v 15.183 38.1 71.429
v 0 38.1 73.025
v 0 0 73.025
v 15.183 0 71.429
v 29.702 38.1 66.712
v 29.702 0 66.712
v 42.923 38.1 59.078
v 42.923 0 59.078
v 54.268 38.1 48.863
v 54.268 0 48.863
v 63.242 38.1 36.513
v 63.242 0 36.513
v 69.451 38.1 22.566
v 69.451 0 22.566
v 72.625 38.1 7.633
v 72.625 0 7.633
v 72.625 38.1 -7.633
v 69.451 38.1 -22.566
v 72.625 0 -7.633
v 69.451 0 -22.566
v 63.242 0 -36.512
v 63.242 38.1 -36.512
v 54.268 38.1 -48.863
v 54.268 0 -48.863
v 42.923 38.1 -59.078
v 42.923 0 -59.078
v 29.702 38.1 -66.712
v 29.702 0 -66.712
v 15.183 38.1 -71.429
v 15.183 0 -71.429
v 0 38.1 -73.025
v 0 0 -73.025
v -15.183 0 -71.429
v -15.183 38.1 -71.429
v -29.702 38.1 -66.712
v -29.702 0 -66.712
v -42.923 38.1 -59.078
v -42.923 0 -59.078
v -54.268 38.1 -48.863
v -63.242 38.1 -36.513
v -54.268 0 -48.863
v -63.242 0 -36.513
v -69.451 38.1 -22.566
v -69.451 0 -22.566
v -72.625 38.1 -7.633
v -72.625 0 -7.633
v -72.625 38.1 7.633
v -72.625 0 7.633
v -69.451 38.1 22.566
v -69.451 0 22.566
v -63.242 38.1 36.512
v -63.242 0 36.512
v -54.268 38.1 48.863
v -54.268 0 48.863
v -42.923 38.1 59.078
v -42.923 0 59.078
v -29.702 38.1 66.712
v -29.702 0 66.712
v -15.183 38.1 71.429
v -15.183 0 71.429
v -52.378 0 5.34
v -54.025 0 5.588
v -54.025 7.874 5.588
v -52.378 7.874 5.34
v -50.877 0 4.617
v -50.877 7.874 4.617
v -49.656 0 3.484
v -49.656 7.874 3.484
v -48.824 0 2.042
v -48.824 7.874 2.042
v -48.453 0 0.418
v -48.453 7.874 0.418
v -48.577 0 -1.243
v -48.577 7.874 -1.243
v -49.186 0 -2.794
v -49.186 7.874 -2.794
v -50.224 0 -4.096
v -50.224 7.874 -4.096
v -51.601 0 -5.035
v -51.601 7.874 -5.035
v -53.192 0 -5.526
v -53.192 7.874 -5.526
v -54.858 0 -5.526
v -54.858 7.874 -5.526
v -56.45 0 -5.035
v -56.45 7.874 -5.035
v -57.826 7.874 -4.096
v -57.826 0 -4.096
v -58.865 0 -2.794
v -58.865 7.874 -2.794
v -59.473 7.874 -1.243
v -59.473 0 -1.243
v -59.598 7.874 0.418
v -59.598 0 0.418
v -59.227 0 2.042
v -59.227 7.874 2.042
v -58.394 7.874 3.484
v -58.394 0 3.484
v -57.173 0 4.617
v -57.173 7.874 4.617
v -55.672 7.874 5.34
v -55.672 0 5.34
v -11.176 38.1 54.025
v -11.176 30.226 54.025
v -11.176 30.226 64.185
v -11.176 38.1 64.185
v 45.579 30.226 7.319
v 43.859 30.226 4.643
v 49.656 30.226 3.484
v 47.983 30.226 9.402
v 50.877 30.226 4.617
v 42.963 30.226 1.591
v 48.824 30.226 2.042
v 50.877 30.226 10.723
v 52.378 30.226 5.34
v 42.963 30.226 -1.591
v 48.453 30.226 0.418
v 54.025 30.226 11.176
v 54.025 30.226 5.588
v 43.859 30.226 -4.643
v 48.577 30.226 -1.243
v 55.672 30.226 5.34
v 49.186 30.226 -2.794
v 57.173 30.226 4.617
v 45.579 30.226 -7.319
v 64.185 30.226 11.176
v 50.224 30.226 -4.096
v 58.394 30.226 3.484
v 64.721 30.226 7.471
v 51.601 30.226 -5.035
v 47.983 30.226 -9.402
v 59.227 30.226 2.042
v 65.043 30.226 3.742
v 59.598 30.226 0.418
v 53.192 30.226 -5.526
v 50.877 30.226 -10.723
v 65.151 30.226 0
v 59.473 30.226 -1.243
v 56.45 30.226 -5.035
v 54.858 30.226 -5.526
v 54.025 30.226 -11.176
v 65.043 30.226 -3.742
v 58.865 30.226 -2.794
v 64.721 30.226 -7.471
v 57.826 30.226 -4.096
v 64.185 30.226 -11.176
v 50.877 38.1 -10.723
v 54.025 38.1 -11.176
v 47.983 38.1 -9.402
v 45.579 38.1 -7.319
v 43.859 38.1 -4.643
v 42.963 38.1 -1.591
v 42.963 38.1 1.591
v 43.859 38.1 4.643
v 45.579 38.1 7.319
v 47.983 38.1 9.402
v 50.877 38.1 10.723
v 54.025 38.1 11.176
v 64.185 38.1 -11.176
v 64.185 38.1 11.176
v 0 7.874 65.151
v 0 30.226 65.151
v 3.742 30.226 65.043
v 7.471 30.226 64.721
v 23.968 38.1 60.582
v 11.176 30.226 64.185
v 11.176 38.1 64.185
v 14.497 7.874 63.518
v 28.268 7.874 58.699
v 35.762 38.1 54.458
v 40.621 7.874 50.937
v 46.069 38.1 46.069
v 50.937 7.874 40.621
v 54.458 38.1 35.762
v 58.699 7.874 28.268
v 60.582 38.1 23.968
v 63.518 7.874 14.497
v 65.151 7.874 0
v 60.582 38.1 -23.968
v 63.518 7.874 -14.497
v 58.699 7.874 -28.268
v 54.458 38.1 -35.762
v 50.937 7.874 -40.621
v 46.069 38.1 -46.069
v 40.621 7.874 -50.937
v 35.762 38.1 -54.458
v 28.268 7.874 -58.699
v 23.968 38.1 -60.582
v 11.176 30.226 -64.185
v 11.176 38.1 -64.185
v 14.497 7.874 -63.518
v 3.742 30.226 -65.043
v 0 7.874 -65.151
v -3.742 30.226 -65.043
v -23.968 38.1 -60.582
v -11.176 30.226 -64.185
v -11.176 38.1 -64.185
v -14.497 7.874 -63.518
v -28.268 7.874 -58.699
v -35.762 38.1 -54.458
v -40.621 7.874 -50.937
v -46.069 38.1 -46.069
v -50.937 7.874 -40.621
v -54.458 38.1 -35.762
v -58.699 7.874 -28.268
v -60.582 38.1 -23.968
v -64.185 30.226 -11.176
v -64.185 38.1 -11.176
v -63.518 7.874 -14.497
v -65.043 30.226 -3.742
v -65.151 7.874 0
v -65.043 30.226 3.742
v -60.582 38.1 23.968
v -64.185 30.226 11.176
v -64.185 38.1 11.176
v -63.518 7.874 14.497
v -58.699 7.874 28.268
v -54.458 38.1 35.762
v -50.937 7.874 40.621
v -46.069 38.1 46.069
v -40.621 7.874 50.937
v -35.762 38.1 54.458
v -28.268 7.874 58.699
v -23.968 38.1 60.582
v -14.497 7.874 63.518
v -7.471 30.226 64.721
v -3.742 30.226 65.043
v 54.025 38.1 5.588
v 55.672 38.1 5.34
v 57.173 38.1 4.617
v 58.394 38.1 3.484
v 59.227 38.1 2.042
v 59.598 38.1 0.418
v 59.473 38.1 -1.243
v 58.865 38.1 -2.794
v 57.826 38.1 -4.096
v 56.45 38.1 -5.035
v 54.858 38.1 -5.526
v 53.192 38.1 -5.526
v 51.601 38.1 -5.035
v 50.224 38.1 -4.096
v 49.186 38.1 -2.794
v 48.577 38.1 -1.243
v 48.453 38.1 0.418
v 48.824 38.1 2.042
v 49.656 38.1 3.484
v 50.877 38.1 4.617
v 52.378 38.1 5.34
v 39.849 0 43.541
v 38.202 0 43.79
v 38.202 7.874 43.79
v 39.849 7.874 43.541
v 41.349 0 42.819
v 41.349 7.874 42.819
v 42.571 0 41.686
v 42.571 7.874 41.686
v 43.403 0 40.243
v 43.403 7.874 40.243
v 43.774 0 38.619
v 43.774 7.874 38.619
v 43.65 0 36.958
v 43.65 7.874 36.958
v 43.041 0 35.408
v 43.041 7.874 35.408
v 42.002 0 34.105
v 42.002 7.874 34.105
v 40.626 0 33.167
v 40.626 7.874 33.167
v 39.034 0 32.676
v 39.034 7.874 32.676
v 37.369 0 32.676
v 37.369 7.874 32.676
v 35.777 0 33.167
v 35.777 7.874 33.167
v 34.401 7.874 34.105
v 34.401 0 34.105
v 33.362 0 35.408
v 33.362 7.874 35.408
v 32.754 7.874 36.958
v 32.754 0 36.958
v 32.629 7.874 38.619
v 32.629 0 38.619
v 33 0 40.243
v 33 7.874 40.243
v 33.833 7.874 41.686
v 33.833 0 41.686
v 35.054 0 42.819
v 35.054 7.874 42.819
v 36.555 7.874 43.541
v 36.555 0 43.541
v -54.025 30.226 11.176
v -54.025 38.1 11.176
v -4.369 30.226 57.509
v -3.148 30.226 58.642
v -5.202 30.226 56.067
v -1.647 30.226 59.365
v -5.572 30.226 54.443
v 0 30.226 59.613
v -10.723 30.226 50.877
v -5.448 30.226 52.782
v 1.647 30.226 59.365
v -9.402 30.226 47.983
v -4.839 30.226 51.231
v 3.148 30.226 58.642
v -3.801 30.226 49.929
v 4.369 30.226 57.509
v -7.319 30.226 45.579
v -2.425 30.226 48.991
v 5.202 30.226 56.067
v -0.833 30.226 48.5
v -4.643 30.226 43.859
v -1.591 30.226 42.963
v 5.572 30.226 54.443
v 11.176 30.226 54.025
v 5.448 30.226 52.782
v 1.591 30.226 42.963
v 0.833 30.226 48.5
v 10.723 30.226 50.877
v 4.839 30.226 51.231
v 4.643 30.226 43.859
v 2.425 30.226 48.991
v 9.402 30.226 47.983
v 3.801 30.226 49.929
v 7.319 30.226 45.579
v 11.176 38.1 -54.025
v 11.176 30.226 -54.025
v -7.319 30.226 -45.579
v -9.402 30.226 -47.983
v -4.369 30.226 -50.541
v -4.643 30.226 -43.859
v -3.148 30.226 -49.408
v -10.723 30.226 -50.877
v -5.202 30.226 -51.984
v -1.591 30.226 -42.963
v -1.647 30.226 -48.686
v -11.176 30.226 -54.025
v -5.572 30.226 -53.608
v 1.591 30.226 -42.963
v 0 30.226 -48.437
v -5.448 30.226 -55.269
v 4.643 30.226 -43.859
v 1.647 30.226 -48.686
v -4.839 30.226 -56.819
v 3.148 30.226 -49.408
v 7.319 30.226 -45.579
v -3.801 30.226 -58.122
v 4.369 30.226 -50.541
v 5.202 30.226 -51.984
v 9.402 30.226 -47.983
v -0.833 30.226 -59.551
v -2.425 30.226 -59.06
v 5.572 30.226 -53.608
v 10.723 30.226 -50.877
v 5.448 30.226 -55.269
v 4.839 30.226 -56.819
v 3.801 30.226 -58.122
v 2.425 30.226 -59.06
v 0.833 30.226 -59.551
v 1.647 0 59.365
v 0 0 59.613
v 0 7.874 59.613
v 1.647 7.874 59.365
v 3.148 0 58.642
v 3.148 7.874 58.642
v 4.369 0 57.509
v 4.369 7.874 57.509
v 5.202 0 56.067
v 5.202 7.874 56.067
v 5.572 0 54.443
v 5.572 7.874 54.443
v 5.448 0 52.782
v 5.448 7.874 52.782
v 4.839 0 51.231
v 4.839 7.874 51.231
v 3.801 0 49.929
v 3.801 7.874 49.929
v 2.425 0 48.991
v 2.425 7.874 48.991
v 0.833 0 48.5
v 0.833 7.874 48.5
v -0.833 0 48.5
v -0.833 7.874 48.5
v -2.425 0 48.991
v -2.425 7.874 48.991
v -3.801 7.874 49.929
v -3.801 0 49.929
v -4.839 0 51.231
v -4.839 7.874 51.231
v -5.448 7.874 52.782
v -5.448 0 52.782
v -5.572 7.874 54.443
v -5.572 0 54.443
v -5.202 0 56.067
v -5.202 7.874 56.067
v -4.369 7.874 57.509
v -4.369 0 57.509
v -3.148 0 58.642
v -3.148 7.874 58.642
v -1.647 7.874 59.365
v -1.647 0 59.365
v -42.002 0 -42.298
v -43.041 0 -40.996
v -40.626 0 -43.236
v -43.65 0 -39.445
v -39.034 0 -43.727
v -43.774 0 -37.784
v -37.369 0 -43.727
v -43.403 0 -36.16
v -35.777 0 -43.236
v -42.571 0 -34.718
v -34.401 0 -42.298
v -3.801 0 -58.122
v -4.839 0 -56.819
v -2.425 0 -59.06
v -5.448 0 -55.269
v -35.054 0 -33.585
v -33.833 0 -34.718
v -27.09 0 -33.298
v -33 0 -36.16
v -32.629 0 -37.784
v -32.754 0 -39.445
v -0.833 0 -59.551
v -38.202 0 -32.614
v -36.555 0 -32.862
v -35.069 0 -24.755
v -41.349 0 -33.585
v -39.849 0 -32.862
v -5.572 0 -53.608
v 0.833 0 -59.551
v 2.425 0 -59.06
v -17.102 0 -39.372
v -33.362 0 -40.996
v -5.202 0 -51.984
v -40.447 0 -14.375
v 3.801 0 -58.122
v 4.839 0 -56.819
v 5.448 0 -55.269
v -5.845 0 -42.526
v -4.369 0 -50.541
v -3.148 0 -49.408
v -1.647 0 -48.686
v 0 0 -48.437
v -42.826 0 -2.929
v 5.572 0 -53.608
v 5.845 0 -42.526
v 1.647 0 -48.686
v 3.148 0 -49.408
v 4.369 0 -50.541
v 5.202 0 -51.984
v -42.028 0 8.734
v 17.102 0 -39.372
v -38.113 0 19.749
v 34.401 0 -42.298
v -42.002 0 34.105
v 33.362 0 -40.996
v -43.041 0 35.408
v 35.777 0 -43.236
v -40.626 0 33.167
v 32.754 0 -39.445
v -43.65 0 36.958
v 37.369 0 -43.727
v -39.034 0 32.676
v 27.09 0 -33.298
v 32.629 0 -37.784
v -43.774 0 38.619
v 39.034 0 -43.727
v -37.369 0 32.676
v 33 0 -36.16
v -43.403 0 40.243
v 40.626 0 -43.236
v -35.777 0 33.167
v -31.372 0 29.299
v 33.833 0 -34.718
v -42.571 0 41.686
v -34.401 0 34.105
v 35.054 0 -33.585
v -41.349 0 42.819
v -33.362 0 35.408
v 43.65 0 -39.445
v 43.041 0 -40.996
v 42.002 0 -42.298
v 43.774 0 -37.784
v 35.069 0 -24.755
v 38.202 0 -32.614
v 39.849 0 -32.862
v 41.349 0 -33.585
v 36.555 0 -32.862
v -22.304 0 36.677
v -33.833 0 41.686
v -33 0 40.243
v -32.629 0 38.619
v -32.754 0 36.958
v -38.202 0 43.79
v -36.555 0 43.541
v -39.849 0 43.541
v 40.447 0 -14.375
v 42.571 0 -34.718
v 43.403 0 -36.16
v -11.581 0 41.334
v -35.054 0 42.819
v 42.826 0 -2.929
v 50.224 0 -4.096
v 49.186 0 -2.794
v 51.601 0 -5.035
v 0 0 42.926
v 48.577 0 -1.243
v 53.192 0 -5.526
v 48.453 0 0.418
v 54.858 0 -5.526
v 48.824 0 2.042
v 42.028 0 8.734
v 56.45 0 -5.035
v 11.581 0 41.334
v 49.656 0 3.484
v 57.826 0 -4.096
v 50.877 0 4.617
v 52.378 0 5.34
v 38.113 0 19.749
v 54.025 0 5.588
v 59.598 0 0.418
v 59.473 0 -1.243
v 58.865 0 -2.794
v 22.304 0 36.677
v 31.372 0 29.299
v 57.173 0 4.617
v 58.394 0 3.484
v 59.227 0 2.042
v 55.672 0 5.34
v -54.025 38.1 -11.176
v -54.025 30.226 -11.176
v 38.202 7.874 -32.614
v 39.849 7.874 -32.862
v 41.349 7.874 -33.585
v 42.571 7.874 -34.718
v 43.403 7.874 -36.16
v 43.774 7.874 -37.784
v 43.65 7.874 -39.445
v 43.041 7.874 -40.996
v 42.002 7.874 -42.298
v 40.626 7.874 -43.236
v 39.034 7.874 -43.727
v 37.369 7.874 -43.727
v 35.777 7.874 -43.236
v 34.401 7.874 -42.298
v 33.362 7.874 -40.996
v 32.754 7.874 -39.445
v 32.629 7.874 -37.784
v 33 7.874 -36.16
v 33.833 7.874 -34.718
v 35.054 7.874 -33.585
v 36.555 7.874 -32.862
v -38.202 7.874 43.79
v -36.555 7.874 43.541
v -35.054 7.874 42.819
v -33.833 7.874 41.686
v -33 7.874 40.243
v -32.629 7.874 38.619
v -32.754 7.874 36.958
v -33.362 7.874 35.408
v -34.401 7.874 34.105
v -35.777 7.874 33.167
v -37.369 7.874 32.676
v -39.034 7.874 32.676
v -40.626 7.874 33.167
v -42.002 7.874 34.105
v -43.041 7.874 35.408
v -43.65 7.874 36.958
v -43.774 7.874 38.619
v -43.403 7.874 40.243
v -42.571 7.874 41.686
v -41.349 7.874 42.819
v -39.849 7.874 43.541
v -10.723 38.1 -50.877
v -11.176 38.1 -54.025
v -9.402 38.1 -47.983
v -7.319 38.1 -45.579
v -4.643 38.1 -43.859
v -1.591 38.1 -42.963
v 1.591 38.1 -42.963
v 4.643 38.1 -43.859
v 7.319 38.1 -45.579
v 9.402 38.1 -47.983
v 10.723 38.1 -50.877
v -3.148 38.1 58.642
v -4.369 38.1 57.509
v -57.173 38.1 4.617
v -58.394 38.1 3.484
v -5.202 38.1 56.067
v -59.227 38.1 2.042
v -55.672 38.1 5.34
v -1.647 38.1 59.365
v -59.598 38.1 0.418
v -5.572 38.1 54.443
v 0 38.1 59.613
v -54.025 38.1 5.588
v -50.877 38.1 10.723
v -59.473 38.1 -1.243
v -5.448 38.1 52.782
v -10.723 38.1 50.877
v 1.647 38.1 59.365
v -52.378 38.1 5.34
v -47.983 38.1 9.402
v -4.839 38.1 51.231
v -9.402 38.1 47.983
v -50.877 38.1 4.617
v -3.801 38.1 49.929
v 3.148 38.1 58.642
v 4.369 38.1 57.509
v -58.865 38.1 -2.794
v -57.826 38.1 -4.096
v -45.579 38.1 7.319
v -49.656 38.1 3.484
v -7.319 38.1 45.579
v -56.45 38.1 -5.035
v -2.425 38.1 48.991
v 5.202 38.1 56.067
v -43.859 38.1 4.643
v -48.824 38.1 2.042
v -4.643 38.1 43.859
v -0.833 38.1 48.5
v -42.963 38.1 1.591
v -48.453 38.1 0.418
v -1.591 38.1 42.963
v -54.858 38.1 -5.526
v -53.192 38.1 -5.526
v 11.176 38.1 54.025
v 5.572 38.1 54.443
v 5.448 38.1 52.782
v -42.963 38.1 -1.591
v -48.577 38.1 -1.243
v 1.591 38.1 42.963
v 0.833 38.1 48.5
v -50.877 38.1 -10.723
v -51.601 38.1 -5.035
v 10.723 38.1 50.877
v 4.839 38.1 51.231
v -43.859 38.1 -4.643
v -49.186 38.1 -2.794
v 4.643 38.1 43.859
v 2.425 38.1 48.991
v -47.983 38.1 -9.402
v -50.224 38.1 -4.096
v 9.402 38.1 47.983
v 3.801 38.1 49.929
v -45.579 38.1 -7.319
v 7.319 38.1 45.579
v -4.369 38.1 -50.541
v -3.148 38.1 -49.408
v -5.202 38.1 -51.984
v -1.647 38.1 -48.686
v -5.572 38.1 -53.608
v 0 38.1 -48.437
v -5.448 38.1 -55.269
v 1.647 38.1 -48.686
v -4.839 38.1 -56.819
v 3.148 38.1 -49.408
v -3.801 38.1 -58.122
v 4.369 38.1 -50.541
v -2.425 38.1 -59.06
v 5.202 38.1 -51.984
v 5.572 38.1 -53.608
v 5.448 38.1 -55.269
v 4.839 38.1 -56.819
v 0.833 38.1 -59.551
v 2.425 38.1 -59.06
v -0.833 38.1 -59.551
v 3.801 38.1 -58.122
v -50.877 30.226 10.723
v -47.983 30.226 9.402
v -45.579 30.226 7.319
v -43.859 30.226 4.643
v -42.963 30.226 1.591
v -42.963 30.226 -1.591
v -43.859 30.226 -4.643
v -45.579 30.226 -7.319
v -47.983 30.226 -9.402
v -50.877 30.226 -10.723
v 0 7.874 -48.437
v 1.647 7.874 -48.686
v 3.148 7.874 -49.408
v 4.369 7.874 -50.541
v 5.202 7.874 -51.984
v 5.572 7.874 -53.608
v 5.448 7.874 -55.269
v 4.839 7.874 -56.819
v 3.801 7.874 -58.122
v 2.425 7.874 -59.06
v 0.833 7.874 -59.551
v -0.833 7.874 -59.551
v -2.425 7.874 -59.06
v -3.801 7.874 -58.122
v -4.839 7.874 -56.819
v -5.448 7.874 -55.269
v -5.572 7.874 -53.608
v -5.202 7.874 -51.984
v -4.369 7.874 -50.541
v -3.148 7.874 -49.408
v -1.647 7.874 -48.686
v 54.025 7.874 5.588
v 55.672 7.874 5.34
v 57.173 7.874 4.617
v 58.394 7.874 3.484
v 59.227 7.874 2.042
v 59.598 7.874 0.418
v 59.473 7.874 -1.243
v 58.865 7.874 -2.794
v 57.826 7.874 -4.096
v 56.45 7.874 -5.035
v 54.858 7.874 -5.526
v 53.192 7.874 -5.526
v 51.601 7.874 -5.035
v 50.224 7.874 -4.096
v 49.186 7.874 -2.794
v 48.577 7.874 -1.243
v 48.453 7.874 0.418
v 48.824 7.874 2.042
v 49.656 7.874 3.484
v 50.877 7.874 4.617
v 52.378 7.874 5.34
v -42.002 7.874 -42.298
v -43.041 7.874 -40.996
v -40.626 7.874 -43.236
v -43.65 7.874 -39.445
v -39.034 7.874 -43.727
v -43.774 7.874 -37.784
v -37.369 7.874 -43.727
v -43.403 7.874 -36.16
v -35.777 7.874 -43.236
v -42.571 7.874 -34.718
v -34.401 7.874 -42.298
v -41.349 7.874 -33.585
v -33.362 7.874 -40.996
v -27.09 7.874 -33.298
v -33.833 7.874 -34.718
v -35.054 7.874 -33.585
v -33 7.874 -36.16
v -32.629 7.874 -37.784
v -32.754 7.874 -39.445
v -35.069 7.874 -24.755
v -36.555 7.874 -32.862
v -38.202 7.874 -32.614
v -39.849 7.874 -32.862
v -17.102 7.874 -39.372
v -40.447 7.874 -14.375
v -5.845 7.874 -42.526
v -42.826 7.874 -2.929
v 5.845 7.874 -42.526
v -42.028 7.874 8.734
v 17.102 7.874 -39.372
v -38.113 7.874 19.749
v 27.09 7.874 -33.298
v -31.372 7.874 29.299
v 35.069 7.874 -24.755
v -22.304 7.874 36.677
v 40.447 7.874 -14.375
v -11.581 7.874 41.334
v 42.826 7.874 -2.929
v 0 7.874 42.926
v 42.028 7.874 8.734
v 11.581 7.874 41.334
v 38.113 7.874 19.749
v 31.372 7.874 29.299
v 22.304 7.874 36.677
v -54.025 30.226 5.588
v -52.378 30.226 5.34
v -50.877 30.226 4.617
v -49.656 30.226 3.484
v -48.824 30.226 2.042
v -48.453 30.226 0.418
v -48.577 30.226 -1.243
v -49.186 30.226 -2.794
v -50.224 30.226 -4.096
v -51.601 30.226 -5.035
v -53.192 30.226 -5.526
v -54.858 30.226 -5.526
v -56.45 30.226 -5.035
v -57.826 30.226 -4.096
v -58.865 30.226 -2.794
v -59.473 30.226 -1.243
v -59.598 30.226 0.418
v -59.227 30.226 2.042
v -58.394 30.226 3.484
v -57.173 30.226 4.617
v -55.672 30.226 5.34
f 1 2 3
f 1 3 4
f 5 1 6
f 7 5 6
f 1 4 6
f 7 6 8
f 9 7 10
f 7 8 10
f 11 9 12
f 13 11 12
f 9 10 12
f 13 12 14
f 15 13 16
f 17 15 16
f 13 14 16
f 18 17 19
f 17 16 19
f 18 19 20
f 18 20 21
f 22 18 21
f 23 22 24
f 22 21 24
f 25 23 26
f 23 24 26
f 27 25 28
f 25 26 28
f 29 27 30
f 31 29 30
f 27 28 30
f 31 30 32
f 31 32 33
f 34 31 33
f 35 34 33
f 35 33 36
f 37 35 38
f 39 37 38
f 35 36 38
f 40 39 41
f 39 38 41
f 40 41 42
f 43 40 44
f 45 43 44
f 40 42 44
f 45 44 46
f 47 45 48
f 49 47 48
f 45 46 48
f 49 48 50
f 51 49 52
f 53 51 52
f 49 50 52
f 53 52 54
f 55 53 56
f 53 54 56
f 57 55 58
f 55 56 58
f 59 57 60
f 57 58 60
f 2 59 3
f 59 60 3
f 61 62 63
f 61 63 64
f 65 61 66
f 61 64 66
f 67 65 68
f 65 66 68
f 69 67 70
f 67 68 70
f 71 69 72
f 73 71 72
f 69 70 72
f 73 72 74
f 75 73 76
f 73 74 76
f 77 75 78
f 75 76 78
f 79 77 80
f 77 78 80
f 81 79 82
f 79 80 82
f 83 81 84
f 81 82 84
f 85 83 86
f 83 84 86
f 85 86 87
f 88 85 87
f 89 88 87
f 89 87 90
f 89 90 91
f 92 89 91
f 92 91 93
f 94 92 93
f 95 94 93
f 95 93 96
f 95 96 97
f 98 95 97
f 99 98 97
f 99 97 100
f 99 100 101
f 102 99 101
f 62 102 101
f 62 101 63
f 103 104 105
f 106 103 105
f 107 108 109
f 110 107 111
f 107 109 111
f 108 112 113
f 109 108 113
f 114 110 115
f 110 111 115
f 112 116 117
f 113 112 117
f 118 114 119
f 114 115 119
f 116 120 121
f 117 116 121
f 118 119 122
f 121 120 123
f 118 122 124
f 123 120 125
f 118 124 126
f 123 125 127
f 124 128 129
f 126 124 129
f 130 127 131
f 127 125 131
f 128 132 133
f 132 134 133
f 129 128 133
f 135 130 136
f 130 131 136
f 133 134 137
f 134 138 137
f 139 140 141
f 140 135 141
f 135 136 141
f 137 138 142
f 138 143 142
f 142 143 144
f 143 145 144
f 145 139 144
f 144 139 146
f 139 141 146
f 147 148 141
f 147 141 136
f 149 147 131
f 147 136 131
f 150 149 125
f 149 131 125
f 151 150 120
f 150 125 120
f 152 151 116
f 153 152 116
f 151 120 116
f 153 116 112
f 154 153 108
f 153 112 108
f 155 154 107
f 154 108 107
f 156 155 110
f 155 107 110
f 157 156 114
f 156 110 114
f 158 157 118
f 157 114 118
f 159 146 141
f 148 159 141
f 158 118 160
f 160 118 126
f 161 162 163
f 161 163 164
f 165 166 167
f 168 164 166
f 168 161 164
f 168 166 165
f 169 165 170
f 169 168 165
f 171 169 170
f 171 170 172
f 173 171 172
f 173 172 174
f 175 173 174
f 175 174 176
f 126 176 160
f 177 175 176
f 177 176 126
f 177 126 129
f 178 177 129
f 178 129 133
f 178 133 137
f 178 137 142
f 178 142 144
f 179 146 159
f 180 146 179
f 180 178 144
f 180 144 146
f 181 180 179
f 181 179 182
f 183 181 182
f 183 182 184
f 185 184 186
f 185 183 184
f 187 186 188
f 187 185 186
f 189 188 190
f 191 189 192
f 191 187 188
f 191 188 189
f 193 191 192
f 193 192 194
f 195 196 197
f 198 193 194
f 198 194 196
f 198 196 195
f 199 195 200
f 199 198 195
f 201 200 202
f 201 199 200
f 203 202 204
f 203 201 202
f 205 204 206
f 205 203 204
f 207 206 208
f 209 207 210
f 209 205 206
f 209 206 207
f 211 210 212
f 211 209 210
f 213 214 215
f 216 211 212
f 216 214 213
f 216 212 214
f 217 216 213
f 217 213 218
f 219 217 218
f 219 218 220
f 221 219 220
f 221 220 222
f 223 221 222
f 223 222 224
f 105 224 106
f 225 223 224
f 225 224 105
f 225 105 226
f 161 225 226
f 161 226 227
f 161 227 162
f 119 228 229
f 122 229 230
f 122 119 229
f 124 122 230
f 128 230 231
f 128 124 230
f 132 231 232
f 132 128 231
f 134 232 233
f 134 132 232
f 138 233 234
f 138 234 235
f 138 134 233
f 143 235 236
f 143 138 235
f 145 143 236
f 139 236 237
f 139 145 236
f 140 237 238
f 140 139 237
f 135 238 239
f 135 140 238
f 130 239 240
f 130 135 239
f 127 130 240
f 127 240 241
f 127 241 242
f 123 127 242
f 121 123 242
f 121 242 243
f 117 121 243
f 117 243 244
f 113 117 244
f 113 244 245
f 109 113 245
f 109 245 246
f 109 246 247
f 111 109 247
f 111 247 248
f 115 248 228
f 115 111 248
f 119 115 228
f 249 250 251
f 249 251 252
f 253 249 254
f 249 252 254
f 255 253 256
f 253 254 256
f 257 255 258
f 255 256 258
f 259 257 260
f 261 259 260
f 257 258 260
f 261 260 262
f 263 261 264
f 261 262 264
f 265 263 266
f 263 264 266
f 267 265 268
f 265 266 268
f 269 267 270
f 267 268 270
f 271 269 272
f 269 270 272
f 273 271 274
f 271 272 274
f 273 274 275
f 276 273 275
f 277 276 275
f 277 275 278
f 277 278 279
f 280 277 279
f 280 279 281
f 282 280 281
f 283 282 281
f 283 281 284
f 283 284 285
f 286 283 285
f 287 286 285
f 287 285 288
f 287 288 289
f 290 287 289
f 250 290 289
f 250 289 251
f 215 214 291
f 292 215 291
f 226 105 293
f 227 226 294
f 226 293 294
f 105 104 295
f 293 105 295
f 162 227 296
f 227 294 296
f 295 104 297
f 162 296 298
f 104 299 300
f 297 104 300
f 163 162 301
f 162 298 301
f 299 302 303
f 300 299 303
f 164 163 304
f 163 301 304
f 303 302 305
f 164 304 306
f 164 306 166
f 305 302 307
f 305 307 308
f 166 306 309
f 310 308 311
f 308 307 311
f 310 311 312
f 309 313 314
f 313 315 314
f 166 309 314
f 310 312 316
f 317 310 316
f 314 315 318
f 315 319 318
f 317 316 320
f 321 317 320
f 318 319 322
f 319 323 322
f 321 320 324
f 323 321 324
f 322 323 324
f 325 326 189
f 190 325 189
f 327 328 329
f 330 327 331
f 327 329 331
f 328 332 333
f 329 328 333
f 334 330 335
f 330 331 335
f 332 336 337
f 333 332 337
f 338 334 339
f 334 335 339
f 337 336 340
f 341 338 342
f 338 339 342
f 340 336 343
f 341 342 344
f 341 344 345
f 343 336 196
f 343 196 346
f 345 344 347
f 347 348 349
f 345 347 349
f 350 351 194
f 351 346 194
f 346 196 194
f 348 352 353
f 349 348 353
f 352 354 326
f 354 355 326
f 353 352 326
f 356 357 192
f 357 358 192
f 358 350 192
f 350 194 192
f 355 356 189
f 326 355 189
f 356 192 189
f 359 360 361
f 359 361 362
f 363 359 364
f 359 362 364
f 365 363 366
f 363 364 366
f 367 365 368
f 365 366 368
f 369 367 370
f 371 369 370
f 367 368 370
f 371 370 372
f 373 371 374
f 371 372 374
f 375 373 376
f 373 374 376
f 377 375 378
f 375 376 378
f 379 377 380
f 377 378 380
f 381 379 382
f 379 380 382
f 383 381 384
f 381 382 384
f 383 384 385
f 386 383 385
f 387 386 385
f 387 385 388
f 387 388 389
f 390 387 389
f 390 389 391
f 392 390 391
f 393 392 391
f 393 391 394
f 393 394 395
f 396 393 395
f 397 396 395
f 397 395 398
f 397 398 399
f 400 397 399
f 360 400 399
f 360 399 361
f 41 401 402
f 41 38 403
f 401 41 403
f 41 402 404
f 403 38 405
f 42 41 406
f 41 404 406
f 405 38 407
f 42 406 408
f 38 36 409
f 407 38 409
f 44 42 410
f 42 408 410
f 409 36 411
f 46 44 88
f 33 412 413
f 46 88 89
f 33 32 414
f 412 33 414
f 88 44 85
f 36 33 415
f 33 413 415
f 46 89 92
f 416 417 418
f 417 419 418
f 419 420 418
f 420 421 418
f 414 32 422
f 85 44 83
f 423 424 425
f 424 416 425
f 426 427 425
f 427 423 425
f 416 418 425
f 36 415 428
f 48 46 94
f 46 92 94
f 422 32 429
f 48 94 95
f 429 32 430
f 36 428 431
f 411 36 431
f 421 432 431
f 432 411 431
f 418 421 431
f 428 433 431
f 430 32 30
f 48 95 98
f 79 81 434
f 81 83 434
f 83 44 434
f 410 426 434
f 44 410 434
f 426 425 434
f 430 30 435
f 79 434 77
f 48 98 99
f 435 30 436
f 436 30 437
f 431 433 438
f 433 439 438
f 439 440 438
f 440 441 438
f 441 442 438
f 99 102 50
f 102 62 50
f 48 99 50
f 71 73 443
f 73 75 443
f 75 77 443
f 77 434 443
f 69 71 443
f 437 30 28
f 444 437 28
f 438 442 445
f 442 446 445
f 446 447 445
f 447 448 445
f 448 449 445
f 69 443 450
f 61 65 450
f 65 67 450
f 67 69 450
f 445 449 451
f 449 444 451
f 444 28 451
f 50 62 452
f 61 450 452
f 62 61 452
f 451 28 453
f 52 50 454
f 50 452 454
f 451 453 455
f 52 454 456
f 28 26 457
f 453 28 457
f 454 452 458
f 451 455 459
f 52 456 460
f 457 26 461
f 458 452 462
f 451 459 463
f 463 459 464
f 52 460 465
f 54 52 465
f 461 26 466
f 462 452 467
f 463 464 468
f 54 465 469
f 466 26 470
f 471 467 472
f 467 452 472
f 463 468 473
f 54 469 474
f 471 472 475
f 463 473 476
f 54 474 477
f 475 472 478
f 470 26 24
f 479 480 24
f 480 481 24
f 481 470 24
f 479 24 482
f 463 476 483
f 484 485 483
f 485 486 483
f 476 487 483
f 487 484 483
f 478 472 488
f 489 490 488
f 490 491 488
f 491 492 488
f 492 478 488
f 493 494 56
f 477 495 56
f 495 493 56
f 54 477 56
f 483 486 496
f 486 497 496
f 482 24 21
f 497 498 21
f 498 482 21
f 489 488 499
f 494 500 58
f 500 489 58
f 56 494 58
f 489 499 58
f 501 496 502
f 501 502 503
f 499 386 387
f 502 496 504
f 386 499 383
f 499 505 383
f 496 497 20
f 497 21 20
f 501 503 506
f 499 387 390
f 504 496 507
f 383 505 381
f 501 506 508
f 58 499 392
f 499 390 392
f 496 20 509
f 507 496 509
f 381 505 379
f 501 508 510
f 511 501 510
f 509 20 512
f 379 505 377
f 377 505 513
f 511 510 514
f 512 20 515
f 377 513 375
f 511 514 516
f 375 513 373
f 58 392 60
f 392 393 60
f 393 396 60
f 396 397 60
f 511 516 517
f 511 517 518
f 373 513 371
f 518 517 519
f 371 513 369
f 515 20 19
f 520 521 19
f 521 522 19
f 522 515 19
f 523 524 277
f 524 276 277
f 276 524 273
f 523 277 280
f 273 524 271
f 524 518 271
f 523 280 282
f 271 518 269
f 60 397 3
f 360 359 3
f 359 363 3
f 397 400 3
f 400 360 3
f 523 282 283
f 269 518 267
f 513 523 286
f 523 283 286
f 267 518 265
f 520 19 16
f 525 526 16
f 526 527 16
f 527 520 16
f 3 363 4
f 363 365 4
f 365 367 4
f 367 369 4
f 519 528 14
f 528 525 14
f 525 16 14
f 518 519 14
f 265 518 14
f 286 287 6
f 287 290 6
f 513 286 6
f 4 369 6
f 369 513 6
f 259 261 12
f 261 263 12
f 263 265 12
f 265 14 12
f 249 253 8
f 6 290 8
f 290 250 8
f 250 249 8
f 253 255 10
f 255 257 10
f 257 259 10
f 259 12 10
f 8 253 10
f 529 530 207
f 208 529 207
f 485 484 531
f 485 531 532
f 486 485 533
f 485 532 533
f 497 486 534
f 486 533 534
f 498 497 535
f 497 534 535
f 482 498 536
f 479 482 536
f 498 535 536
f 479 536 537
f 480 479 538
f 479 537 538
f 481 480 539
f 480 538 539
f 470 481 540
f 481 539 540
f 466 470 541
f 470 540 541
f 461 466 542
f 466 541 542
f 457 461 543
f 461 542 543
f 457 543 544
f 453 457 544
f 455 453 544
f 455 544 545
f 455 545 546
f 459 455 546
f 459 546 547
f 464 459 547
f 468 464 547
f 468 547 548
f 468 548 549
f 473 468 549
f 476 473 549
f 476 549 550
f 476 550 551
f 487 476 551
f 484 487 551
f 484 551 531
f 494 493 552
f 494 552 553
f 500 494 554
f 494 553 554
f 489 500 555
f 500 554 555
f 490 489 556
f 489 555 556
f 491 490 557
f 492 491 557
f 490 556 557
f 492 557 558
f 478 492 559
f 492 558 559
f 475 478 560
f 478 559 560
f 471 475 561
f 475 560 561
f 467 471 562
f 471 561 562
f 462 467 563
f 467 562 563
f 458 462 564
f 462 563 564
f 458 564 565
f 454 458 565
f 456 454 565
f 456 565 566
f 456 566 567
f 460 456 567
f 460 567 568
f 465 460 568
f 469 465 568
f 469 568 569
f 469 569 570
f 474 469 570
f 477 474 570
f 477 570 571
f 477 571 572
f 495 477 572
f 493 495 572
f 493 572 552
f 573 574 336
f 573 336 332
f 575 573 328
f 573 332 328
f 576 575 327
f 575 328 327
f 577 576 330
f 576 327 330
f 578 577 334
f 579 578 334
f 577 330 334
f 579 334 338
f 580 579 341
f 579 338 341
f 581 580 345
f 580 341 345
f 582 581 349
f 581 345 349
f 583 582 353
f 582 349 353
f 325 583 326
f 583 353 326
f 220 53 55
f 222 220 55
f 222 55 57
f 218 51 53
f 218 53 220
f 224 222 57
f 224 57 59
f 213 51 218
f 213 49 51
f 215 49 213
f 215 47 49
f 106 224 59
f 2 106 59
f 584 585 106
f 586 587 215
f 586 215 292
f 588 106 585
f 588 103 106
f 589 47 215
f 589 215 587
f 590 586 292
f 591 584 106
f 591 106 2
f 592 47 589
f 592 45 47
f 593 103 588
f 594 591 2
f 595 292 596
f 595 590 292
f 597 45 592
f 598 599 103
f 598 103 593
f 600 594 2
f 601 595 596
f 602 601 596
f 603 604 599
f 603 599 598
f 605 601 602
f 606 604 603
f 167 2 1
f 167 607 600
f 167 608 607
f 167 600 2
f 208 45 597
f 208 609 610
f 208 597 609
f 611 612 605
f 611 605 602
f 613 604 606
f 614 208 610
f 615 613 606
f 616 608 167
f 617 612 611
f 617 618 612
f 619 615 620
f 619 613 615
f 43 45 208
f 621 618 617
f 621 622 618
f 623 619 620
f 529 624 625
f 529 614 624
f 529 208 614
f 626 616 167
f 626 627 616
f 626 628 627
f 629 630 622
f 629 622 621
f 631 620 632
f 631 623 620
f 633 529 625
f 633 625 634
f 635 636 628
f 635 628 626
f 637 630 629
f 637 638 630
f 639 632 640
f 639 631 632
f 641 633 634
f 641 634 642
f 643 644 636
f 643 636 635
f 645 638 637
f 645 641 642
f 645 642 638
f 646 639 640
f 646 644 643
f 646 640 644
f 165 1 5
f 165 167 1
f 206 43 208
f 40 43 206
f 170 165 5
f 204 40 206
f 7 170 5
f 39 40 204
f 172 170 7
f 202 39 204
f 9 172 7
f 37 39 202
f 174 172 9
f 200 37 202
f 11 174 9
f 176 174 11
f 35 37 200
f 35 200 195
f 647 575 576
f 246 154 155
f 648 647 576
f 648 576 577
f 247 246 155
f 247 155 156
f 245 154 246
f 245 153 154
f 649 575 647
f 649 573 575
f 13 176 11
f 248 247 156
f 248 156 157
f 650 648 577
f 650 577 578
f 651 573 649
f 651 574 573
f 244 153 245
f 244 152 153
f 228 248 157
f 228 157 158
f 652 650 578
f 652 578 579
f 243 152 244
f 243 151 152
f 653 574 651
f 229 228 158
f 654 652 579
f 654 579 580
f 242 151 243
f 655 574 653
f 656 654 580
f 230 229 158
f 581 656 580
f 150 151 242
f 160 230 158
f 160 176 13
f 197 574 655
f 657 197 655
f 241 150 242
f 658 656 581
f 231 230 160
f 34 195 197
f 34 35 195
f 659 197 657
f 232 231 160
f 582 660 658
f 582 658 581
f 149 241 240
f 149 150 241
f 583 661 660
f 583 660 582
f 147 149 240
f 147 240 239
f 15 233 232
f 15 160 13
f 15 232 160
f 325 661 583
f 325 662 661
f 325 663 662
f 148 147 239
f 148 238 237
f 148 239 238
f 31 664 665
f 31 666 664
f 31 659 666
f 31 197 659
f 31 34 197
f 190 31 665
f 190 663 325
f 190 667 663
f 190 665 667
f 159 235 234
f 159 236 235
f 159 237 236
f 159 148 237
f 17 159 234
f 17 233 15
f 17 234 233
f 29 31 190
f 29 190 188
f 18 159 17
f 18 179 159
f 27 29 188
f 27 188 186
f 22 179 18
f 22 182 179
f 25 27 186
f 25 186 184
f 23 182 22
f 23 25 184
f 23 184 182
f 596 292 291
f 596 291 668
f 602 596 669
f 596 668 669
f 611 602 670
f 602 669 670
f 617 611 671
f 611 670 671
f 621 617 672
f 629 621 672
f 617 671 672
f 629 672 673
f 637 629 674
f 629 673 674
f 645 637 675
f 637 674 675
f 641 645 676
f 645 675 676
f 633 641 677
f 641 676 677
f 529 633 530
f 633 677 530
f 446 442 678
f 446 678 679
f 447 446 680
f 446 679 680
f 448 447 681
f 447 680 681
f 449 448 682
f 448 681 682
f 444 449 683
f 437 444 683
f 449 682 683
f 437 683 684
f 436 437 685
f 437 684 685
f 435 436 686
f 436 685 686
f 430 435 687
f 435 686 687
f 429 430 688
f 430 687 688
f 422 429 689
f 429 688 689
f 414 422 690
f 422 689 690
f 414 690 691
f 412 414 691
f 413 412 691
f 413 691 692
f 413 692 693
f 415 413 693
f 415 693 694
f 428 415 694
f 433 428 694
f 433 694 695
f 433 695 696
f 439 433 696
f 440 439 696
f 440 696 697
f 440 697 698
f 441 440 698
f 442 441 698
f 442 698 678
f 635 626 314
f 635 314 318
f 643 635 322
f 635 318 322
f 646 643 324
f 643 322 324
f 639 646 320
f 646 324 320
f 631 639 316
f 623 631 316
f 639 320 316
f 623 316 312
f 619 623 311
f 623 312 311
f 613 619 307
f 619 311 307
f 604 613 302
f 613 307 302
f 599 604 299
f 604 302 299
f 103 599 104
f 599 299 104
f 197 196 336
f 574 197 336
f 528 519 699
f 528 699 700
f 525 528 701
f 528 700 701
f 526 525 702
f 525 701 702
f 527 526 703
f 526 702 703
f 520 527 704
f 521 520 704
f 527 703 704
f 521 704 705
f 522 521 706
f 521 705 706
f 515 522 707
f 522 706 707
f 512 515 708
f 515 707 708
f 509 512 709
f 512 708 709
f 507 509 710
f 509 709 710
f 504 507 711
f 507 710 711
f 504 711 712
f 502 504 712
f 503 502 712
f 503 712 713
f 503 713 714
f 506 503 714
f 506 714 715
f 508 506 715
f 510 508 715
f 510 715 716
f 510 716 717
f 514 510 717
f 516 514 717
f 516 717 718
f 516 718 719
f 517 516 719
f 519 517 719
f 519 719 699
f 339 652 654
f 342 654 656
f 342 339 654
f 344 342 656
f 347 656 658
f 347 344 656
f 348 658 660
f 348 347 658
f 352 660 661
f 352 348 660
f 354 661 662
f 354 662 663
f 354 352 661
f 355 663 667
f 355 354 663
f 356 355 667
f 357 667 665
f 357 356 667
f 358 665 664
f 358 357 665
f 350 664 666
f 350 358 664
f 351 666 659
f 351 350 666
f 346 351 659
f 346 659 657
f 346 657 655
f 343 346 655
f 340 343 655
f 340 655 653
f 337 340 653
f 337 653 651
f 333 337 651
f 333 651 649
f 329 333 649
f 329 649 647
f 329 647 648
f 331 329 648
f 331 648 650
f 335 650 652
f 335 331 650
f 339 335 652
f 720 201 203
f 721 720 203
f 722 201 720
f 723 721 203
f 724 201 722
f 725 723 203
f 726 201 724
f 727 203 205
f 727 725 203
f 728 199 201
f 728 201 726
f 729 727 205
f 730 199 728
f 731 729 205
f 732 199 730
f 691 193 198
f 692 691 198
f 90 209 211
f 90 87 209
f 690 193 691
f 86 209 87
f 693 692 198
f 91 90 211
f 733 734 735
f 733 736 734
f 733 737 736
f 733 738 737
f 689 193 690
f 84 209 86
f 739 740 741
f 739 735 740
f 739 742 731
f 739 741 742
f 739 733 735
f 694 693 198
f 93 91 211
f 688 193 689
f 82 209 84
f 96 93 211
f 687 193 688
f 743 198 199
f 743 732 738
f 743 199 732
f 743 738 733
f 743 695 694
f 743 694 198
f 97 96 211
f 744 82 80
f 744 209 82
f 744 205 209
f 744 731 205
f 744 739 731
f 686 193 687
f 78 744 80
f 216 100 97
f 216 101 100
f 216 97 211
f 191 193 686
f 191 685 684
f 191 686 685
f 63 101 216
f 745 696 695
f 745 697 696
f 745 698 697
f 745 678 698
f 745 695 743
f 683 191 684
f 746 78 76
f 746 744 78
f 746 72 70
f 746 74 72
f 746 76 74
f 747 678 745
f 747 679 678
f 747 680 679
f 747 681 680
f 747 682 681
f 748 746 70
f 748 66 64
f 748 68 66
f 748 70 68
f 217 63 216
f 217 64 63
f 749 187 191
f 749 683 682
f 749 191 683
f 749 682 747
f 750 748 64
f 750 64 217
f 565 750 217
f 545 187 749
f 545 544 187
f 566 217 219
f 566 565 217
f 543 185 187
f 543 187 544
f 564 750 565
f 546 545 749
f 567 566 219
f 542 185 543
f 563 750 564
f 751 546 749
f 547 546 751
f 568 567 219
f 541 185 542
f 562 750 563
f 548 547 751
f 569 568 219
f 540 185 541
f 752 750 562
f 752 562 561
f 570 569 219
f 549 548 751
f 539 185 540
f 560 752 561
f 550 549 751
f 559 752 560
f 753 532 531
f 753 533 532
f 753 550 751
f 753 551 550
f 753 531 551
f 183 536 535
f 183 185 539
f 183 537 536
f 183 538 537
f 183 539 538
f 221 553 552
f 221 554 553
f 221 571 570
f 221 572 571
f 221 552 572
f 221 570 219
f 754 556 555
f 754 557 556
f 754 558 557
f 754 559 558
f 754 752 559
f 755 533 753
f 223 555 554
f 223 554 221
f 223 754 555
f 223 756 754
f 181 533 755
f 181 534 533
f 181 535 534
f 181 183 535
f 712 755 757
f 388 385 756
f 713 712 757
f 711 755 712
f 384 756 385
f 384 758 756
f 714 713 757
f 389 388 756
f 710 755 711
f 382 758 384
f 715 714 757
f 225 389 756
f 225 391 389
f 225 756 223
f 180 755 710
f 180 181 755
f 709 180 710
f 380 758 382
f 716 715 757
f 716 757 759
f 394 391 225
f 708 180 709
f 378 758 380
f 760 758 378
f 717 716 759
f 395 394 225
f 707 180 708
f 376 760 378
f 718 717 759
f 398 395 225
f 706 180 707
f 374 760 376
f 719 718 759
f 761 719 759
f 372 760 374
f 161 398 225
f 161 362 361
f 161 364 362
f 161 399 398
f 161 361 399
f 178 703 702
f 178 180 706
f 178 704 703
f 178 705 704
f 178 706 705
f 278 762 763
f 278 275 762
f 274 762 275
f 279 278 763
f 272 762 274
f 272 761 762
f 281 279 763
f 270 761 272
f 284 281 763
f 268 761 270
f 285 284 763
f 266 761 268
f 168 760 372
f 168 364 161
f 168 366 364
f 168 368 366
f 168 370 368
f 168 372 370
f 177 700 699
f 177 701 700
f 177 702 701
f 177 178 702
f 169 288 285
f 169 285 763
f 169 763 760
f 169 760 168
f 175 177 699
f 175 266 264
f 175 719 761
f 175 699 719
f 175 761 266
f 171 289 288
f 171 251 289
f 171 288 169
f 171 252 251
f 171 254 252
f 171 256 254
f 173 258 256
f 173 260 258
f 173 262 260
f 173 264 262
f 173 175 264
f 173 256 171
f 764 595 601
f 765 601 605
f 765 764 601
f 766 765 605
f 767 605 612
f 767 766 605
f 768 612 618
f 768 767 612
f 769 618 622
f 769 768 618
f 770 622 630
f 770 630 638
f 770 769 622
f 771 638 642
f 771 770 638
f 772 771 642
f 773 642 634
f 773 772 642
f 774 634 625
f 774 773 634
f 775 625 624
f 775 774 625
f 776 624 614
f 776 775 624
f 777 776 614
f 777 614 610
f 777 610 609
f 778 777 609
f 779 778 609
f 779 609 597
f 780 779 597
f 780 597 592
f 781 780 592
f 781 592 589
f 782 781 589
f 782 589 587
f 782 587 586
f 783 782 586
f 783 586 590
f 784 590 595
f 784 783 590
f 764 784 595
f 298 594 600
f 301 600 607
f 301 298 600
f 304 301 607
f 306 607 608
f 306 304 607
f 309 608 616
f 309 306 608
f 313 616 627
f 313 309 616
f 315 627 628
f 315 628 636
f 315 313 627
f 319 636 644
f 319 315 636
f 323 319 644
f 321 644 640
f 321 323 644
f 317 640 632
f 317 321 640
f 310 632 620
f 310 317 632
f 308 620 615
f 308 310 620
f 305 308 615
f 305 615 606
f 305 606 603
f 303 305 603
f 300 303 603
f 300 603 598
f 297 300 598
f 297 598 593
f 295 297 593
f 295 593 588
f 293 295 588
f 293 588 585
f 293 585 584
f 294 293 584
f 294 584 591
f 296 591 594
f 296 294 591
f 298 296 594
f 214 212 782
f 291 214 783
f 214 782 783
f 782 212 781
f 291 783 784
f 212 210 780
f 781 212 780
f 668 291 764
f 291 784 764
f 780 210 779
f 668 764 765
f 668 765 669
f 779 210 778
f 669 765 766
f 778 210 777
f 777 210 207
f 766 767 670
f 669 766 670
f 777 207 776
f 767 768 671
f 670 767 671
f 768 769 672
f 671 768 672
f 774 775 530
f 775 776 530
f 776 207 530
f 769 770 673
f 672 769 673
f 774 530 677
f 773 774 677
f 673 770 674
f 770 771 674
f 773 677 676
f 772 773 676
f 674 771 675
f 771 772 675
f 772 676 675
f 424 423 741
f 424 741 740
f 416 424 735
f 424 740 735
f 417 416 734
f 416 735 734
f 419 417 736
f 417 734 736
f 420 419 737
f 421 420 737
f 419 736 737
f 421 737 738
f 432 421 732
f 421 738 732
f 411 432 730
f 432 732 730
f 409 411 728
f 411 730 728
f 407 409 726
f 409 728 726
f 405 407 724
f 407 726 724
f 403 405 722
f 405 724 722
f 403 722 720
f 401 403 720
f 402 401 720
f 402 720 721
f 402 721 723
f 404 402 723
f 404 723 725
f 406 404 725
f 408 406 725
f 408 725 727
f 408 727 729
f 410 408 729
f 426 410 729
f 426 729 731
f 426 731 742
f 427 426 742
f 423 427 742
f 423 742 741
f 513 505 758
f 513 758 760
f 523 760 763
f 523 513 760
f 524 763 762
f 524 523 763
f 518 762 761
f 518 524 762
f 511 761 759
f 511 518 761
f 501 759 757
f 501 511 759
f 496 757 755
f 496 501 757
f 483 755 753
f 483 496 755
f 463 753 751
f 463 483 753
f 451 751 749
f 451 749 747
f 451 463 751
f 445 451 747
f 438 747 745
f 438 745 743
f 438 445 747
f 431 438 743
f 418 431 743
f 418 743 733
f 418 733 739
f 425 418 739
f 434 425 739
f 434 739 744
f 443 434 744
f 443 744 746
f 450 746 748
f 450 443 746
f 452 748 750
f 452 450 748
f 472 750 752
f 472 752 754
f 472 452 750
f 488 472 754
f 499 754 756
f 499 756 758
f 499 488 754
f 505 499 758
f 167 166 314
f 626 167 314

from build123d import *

# Parameters (mm, degrees)
SKETCH1_R           = 73.025
SKETCH1_R_2         = 42.926
BOSS_EXTRUDE1_DEPTH = 7.874
SKETCH2_R           = 73.025
SKETCH2_R_2         = 65.151
BOSS_EXTRUDE2_DEPTH = 30.226
BOSS_EXTRUDE3_START = -7.874
SKETCH3_R           = 5.588
BOSS_EXTRUDE3_DEPTH = 7.874
SKETCH4_R           = 5.588
CUT_EXTRUDE1_DEPTH  = 108.605354541


with BuildPart() as part:
    # Sketch1 → Boss-Extrude1 (new body)
    with BuildSketch(Plane(origin=(0, 0, 0), x_dir=(1, 0, 0), z_dir=(0, 1, 0))):
        with Locations(Location((0, 0, 0), (0, 0, 270))):
            Circle(SKETCH1_R)
        with Locations(Location((0, 0, 0), (0, 0, 270))):
            Circle(SKETCH1_R_2, mode=Mode.SUBTRACT)
    extrude(amount=BOSS_EXTRUDE1_DEPTH)

    # Sketch2 → Boss-Extrude2 (add)
    with BuildSketch(Plane(origin=(0, 7.874, 0), x_dir=(1, 0, 0), z_dir=(0, 1, 0))):
        with Locations(Location((0, 0, 0), (0, 0, 270))):
            Circle(SKETCH2_R)
        with Locations(Location((0, 0, 0), (0, 0, 270))):
            Circle(SKETCH2_R_2, mode=Mode.SUBTRACT)
    extrude(amount=BOSS_EXTRUDE2_DEPTH)

    # Sketch3 → Boss-Extrude3 (add)
    # profile 1 of 4: a face of its own
    with BuildSketch(Plane(origin=(0, 38.1, 0), x_dir=(1, 0, 0), z_dir=(0, 1, 0)).offset(BOSS_EXTRUDE3_START)):
        with BuildLine():
            Line((-54.025277323, 11.176), (-64.185277323, 11.176))
            ThreePointArc((-64.185277323, 11.176), (-65.151, 0), (-64.185277323, -11.176))
            Line((-64.185277323, -11.176), (-54.025277323, -11.176))
            ThreePointArc((-54.025277323, -11.176), (-42.849277323, 0), (-54.025277323, 11.176))
        make_face()
        with Locations(Location((-54.025277323, 0, 0), (0, 0, 270))):
            Circle(SKETCH3_R, mode=Mode.SUBTRACT)
    # profile 2 of 4: a face of its own
    with BuildSketch(Plane(origin=(0, 38.1, 0), x_dir=(1, 0, 0), z_dir=(0, 1, 0)).offset(BOSS_EXTRUDE3_START)):
        with BuildLine():
            ThreePointArc((11.176, 64.185277323), (0, 65.151), (-11.176, 64.185277323))
            Line((-11.176, 64.185277323), (-11.176, 54.025277323))
            ThreePointArc((-11.176, 54.025277323), (0, 42.849277323), (11.176, 54.025277323))
            Line((11.176, 54.025277323), (11.176, 64.185277323))
        make_face()
        with Locations(Location((0, 54.025277323, 0), (0, 0, 270))):
            Circle(SKETCH3_R, mode=Mode.SUBTRACT)
    # profile 3 of 4: a face of its own
    with BuildSketch(Plane(origin=(0, 38.1, 0), x_dir=(1, 0, 0), z_dir=(0, 1, 0)).offset(BOSS_EXTRUDE3_START)):
        with BuildLine():
            ThreePointArc((65.151, 0), (64.909120329, 5.608823323), (64.185277323, 11.176))
            Line((64.185277323, 11.176), (54.025277323, 11.176))
            ThreePointArc((54.025277323, 11.176), (42.849277323, 0), (54.025277323, -11.176))
            Line((54.025277323, -11.176), (64.185277323, -11.176))
            ThreePointArc((64.185277323, -11.176), (64.909120329, -5.608823323), (65.151, 0))
        make_face()
        with Locations(Location((54.025277323, 0, 0), (0, 0, 270))):
            Circle(SKETCH3_R, mode=Mode.SUBTRACT)
    # profile 4 of 4: a face of its own
    with BuildSketch(Plane(origin=(0, 38.1, 0), x_dir=(1, 0, 0), z_dir=(0, 1, 0)).offset(BOSS_EXTRUDE3_START)):
        with BuildLine():
            Line((-11.176, -54.025277323), (-11.176, -64.185277323))
            ThreePointArc((-11.176, -64.185277323), (0, -65.151), (11.176, -64.185277323))
            Line((11.176, -64.185277323), (11.176, -54.025277323))
            ThreePointArc((11.176, -54.025277323), (0, -42.849277323), (-11.176, -54.025277323))
        make_face()
        with Locations(Location((0, -54.025277323, 0), (0, 0, 270))):
            Circle(SKETCH3_R, mode=Mode.SUBTRACT)
    extrude(amount=BOSS_EXTRUDE3_DEPTH)

    # Sketch4 → Cut-Extrude1 (cut, through all)
    with BuildSketch(Plane(origin=(0, 7.874, 0), x_dir=(1, 0, 0), z_dir=(0, 1, 0))):
        with Locations(Location((-54.025277323, 0, 0), (0, 0, 270))):
            Circle(SKETCH4_R)
        with Locations(Location((-38.20163995, 38.20163995, 0), (0, 0, 270))):
            Circle(SKETCH4_R)
        with Locations(Location((0, 54.025277323, 0), (0, 0, 270))):
            Circle(SKETCH4_R)
        with Locations(Location((38.20163995, 38.20163995, 0), (0, 0, 270))):
            Circle(SKETCH4_R)
        with Locations(Location((54.025277323, 0, 0), (0, 0, 270))):
            Circle(SKETCH4_R)
        with Locations(Location((38.20163995, -38.20163995, 0), (0, 0, 270))):
            Circle(SKETCH4_R)
        with Locations(Location((0, -54.025277323, 0), (0, 0, 270))):
            Circle(SKETCH4_R)
        with Locations(Location((-38.20163995, -38.20163995, 0), (0, 0, 270))):
            Circle(SKETCH4_R)
    extrude(amount=-CUT_EXTRUDE1_DEPTH, mode=Mode.SUBTRACT)


solid = part.part
